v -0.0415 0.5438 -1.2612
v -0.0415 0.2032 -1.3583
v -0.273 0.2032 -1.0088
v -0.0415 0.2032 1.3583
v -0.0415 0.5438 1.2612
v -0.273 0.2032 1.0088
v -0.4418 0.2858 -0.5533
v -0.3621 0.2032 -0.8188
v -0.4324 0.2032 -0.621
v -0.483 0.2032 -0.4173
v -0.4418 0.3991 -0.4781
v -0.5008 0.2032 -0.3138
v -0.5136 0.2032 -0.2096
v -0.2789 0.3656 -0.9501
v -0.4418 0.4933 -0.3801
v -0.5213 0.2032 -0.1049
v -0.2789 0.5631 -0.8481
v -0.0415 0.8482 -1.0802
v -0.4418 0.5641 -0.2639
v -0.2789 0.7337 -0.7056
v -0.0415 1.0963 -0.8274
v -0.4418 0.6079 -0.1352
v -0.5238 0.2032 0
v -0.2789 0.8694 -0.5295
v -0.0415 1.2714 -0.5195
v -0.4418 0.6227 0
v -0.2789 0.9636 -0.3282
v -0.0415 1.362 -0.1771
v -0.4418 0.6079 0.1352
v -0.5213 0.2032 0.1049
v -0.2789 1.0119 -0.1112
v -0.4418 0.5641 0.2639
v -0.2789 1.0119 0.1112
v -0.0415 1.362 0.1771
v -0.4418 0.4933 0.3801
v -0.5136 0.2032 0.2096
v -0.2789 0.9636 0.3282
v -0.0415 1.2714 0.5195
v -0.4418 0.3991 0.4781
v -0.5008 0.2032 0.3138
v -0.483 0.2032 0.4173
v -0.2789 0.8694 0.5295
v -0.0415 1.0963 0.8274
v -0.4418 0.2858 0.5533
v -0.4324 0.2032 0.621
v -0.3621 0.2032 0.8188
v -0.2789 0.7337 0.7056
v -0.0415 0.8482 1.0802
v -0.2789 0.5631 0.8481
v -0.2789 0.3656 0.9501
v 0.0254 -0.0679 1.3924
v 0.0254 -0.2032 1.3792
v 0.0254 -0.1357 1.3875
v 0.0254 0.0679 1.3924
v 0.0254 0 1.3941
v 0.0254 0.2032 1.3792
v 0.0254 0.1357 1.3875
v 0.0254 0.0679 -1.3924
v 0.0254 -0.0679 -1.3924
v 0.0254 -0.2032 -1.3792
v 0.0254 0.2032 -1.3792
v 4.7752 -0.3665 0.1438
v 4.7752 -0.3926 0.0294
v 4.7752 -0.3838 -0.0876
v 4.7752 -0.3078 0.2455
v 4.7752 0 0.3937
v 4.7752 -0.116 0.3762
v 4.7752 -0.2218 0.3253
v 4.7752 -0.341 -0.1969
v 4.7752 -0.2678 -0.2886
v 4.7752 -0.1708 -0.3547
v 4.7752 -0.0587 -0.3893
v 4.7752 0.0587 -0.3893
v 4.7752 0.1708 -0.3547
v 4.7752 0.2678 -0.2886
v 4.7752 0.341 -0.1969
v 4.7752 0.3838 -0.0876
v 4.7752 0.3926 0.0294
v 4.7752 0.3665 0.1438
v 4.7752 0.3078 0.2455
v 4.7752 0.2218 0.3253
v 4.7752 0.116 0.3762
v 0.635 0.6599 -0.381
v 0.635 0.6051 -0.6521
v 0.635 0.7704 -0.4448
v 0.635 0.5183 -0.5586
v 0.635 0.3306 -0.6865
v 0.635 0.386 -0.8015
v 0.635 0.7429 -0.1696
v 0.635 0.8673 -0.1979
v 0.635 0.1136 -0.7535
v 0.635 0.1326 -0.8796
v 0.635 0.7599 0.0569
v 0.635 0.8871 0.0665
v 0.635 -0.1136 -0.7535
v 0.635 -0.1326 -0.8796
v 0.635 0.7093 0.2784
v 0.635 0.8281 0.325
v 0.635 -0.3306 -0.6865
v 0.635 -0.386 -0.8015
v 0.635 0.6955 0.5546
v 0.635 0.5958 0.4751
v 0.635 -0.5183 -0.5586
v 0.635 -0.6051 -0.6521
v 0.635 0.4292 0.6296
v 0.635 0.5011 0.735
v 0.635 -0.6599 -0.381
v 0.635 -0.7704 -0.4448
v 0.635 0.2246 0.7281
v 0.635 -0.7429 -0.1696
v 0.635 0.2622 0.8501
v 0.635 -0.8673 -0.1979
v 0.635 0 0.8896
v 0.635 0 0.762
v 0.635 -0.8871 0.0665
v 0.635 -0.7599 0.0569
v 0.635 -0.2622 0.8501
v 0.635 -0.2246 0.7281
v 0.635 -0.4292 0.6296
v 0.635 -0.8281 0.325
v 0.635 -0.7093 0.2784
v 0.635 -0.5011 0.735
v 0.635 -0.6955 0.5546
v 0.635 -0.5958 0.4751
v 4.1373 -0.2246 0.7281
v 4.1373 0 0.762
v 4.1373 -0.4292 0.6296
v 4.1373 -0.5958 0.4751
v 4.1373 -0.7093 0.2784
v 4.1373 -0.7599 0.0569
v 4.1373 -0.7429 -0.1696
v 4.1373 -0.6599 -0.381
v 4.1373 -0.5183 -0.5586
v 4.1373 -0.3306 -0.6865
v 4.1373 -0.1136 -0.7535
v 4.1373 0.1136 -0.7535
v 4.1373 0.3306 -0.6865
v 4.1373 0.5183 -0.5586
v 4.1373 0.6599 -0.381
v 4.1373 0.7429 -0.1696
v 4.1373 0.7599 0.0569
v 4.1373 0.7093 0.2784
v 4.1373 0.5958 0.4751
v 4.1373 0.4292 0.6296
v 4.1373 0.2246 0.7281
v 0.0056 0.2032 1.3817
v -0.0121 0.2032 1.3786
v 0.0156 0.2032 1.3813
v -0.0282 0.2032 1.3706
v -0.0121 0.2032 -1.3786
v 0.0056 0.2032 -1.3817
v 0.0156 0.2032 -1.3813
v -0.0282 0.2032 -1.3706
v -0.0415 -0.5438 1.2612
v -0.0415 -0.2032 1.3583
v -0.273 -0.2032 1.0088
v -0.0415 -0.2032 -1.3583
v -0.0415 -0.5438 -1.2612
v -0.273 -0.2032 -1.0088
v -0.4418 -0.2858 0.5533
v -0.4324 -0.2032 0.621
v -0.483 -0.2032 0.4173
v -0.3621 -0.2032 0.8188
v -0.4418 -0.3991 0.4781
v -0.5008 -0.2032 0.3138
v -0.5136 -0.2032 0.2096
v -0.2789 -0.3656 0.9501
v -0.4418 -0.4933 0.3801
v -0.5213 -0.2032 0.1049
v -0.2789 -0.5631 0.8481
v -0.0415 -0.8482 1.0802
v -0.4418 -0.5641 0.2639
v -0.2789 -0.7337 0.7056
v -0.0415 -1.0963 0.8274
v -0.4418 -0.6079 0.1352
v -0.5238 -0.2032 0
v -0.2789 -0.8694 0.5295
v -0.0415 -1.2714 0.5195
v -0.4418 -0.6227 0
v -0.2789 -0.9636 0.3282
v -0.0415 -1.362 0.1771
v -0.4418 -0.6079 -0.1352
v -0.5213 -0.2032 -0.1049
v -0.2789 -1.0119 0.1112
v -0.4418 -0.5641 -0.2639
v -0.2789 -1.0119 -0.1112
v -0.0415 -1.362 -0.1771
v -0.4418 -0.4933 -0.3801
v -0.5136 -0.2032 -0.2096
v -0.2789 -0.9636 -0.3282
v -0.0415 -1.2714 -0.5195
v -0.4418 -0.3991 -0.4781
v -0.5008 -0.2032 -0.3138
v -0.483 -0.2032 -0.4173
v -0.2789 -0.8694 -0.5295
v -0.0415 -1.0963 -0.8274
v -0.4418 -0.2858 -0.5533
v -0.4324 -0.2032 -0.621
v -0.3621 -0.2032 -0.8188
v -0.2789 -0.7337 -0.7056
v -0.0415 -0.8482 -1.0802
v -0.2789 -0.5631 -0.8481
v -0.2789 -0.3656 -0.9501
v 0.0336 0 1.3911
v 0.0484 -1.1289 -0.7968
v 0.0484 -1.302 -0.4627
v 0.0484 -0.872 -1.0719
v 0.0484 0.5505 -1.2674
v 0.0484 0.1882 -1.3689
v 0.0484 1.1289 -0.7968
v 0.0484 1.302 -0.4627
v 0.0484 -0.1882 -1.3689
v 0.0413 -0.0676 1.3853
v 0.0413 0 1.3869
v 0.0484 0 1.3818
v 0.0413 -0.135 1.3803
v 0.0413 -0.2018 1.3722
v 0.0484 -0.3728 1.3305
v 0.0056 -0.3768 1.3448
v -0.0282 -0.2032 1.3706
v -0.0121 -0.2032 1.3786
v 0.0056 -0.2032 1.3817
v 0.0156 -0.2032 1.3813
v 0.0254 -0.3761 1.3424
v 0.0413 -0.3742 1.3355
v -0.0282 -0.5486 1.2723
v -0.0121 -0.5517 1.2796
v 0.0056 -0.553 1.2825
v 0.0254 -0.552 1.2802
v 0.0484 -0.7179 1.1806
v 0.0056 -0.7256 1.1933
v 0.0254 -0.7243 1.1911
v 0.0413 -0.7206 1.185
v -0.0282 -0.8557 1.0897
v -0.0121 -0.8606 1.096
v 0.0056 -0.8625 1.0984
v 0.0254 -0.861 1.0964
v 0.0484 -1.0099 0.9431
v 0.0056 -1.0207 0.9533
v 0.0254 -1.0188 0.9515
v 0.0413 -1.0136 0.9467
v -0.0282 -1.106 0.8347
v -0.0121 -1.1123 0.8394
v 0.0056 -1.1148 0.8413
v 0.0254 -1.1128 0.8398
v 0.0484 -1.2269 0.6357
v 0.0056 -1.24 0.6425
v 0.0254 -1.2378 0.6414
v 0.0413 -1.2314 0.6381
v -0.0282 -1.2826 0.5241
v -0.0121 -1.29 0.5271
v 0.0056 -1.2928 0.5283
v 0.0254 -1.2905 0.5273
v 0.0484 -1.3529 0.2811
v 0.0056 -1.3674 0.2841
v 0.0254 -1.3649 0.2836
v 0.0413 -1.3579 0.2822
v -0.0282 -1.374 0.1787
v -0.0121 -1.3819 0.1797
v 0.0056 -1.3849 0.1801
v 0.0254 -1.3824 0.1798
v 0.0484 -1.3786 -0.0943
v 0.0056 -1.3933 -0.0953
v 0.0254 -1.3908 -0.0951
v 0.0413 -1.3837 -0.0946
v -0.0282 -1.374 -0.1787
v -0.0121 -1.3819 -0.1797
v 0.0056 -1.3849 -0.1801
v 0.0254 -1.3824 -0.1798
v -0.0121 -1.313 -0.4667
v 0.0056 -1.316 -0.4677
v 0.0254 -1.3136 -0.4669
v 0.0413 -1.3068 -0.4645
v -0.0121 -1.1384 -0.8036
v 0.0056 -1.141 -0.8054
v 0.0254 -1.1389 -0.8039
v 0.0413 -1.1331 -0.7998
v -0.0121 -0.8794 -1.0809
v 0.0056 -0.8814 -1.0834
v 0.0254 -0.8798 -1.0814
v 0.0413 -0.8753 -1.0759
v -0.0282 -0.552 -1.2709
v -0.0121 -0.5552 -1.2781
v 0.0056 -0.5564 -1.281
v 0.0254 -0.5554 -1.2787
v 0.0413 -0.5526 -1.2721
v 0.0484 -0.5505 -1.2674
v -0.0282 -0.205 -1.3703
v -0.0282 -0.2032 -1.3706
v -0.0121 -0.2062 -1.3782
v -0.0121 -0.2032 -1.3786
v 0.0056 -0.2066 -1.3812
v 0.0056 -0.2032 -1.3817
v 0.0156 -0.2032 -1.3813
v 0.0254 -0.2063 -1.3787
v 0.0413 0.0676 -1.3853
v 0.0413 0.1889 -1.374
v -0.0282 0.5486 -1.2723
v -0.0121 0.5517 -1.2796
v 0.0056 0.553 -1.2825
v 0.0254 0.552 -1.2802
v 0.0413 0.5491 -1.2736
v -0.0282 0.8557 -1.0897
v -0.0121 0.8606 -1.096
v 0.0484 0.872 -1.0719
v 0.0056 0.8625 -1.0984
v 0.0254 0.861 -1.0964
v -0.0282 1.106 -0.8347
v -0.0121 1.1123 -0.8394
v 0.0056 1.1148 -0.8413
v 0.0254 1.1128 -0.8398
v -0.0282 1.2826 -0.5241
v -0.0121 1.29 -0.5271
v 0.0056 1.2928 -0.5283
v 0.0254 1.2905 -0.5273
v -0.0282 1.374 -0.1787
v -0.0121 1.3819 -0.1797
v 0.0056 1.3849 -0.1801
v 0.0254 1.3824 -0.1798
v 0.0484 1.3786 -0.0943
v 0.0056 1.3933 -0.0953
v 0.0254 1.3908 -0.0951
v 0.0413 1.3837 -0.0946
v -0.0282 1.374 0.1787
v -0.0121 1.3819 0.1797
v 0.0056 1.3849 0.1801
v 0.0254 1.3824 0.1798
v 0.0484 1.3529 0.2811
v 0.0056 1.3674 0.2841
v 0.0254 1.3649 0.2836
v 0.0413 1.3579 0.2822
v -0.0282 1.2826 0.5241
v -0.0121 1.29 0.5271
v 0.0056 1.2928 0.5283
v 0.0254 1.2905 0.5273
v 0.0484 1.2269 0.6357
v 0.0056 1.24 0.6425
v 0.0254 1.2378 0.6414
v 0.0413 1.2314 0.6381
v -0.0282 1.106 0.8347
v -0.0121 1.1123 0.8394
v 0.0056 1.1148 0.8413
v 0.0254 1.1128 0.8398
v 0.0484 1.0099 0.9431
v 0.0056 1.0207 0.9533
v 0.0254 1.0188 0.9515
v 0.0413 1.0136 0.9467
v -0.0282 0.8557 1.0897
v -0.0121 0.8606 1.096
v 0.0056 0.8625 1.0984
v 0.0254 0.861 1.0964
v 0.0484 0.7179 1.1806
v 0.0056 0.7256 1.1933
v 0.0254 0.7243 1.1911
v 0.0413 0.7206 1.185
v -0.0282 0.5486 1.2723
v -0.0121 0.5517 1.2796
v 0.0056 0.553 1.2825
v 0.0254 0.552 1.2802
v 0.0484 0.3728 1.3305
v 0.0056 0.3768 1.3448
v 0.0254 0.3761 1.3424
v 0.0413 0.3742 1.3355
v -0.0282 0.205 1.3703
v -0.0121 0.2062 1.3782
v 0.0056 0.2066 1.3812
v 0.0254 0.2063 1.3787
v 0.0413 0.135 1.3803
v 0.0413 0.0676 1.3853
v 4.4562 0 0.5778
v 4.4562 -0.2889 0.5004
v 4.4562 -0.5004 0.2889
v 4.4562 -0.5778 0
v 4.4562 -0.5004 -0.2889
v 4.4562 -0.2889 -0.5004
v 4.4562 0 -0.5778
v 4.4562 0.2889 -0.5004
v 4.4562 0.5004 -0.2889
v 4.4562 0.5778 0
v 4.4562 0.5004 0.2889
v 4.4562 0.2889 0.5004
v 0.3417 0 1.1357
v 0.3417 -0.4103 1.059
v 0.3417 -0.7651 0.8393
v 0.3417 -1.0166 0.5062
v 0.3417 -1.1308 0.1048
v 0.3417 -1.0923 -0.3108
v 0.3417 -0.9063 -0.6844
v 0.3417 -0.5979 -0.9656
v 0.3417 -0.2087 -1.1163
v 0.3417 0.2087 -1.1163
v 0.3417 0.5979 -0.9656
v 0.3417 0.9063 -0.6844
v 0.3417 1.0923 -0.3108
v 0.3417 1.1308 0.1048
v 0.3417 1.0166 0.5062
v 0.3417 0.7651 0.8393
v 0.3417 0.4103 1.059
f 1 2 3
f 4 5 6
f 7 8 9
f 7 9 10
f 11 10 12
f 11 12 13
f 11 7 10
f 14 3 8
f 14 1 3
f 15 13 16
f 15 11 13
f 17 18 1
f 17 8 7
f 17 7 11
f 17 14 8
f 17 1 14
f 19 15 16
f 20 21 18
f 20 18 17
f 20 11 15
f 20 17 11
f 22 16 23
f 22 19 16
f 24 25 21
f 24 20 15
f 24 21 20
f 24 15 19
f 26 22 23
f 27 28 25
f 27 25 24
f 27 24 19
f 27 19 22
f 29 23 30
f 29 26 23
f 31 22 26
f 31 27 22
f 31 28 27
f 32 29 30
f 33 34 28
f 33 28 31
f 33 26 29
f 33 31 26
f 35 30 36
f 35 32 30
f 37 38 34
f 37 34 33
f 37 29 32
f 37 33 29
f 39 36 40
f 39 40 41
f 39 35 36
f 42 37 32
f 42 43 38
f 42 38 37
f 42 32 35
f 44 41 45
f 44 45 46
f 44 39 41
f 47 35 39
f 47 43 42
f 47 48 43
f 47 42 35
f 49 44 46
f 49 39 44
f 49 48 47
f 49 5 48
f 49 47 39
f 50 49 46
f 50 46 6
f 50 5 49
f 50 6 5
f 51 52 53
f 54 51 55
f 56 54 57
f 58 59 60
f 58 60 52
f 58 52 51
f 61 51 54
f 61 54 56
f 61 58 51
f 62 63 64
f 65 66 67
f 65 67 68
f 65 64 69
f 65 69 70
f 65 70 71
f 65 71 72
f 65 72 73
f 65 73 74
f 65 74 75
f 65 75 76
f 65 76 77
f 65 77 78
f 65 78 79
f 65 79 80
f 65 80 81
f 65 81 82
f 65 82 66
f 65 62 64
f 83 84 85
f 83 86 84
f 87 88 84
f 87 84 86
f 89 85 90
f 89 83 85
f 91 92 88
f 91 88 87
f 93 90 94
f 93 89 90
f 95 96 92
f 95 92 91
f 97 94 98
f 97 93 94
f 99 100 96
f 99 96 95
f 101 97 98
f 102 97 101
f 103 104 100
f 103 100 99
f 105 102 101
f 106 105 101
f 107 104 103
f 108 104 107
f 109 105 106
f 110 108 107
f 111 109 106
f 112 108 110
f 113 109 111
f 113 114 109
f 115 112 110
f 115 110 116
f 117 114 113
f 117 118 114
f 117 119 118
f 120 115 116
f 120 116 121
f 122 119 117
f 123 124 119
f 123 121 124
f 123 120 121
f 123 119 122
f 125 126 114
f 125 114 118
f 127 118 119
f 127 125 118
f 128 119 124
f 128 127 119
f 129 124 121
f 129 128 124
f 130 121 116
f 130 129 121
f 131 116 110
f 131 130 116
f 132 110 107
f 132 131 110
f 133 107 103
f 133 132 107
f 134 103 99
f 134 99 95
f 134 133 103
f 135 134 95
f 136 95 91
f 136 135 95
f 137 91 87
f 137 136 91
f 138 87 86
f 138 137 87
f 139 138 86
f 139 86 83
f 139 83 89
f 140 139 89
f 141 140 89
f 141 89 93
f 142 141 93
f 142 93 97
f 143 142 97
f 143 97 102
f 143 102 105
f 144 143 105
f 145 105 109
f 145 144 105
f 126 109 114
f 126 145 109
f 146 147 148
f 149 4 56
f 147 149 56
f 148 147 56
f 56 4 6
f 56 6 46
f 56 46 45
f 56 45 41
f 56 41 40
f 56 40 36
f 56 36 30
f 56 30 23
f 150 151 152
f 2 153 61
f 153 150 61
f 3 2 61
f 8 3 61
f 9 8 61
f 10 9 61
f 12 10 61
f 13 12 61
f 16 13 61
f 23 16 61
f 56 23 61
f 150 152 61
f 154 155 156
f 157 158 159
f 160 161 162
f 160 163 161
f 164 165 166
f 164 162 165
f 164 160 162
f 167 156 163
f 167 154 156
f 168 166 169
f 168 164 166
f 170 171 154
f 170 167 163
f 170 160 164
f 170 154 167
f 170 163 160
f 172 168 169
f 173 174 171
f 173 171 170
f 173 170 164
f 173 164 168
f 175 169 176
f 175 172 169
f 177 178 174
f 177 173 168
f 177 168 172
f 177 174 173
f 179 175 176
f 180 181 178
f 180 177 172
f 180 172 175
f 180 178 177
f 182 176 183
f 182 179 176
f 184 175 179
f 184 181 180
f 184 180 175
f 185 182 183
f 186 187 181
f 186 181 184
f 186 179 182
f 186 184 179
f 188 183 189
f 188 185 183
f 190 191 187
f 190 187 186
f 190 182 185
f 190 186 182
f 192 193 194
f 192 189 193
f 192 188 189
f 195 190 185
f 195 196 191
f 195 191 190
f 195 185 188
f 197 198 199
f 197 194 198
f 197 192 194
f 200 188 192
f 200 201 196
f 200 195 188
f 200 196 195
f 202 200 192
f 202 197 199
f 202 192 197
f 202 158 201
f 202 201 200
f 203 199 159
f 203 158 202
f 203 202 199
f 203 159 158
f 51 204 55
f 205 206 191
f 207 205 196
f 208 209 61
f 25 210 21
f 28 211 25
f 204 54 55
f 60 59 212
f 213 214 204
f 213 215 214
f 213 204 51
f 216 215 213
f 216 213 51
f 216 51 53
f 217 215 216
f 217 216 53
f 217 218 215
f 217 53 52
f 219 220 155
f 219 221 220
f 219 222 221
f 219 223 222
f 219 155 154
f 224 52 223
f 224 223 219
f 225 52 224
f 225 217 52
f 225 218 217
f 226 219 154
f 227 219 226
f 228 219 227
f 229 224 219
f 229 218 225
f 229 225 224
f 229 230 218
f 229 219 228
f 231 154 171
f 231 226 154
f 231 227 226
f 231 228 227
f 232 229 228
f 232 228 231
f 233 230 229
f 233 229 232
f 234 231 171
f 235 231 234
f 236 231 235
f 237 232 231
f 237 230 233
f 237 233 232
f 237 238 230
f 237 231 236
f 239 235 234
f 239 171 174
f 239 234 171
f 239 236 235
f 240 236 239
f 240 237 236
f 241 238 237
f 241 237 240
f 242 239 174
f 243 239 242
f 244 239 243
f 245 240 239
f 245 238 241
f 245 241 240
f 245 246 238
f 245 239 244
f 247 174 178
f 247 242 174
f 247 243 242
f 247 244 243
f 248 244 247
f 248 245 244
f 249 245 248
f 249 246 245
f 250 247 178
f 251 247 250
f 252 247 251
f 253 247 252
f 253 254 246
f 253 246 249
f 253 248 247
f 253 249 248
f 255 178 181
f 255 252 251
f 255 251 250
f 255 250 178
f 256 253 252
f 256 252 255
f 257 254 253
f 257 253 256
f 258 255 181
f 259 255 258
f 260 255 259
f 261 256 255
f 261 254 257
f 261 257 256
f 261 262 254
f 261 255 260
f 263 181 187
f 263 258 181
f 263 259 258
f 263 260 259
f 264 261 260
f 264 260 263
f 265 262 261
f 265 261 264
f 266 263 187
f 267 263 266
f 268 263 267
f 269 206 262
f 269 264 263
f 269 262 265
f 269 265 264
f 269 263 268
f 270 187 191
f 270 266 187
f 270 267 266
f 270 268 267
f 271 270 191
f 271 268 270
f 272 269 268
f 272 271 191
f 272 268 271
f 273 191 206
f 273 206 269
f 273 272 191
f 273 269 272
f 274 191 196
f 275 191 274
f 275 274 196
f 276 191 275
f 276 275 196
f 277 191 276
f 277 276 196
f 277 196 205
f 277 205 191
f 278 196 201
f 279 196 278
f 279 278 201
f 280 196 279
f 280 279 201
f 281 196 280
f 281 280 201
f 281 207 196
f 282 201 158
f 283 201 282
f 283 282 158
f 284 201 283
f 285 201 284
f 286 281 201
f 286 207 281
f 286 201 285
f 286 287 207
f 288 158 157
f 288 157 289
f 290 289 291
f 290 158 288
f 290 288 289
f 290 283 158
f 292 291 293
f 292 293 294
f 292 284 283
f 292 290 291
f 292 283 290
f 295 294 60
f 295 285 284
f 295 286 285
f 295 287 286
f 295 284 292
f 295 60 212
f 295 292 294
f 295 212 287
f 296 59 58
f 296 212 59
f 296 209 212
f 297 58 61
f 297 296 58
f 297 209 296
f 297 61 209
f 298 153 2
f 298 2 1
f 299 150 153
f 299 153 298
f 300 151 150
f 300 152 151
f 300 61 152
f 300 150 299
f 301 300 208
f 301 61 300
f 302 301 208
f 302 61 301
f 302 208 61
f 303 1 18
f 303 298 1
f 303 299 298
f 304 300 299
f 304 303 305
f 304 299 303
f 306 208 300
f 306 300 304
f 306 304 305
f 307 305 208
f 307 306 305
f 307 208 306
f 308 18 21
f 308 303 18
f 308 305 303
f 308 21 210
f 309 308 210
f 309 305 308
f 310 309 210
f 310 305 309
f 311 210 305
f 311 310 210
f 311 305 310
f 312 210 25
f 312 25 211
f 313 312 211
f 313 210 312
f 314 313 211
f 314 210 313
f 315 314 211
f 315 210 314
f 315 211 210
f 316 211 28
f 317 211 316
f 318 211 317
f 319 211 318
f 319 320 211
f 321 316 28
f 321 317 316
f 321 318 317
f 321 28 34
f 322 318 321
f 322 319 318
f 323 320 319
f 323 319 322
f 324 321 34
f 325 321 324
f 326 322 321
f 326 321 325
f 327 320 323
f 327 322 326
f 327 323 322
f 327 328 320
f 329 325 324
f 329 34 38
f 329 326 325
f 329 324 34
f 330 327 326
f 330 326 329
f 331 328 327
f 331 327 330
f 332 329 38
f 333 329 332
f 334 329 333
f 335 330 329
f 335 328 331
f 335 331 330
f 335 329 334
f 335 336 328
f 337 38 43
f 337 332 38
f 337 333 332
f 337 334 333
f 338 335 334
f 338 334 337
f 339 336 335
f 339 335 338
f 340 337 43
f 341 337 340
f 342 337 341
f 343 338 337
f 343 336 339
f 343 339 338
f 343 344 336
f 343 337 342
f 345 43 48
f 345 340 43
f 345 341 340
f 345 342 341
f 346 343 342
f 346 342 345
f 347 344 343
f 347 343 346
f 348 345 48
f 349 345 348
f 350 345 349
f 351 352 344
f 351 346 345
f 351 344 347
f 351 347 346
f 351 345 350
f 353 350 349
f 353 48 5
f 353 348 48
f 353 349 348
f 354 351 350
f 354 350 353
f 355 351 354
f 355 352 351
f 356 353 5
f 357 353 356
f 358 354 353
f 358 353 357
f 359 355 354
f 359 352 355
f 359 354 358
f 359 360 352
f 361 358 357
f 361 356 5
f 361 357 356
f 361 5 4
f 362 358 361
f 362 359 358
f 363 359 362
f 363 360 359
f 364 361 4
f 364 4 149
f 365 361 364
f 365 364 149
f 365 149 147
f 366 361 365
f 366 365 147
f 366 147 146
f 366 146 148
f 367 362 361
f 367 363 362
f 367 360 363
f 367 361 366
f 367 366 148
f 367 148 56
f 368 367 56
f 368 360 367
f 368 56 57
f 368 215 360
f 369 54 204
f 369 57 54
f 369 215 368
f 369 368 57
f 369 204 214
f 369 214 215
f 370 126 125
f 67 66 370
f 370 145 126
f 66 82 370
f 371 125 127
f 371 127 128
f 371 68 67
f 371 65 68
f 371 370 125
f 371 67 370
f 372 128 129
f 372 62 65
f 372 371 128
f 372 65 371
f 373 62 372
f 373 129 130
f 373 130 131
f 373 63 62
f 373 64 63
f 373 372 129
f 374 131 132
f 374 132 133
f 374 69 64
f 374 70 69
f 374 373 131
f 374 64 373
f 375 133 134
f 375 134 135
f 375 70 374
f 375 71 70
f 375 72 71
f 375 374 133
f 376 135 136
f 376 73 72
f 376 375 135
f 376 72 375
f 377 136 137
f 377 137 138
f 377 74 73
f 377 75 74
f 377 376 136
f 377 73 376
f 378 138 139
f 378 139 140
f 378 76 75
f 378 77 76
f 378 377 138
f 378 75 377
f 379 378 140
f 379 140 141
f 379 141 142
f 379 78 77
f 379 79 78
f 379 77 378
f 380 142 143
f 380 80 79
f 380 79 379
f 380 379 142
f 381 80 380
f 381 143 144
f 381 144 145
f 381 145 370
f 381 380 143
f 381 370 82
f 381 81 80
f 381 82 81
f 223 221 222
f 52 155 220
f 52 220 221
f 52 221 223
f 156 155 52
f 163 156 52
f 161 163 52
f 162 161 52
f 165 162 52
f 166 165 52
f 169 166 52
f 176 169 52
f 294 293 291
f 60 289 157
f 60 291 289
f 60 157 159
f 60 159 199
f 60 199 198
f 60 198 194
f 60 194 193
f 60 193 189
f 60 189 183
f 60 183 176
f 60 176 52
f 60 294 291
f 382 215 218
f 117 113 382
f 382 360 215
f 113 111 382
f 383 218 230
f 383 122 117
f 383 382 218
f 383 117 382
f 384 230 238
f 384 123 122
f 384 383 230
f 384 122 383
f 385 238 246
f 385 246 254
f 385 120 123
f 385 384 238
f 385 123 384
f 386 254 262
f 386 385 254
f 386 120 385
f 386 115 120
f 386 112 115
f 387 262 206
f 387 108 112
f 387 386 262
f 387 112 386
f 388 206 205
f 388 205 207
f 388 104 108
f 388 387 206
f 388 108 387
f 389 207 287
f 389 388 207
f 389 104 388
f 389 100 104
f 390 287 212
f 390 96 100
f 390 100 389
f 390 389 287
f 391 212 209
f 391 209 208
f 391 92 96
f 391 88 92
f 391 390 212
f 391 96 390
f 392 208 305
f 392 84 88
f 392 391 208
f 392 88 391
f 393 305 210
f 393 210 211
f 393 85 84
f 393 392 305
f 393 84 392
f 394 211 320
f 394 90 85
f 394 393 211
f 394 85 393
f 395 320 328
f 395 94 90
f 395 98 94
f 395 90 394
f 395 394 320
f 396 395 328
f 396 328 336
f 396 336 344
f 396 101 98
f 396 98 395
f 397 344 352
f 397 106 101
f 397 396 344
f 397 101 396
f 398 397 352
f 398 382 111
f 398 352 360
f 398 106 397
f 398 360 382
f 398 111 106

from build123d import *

# Parameters (mm, degrees)
SLOT_CUT_EXTRUDE1_DEPTH      = 6.167561086
SLOT_CUT_EXTRUDE1_DEPTH_BACK = 6.167561086
SKETCH2_W                    = 0.5588
SKETCH2_H                    = 0.4064


with BuildPart() as part:
    # Sketch1 → base-Revolve (revolve)
    with BuildSketch(Plane.XY, mode=Mode.PRIVATE) as base_revolve_sk:
        with BuildLine():
            Line((0.048416124, 1.381774048), (0.635, 0.889571734))
            Line((0.635, 0.889571734), (0.635, 0.762))
            Line((0.635, 0.762), (4.7752, 0.762))
            Line((4.7752, 0.762), (4.7752, 0))
            Line((4.7752, 0), (0, 0))
            Line((0, 0), (-0.5334, 0))
            ThreePointArc((-0.5334, 0), (-0.406704998, 0.729445049), (-0.041460392, 1.373446664))
            ThreePointArc((-0.041460392, 1.373446664), (0.001740699, 1.396359404), (0.048416124, 1.381774048))
        make_face()
    revolve(base_revolve_sk.sketch.rotate(Axis((0, 0, 0), (1, 0, 0)), 90), axis=Axis((0, 0, 0), (1, 0, 0)))

    # Sketch2 → slot_Cut-Extrude1 (cut, two sides: drawn at the far end of the back side and taken through both)
    with BuildSketch(Plane.XY.offset(-SLOT_CUT_EXTRUDE1_DEPTH_BACK)):
        with Locations((-0.254, 0)):
            Rectangle(SKETCH2_W, SKETCH2_H)
    extrude(amount=SLOT_CUT_EXTRUDE1_DEPTH + SLOT_CUT_EXTRUDE1_DEPTH_BACK, mode=Mode.SUBTRACT)

    # Sketch8 → point_Cut-Revolve1 (revolve, cut)
    with BuildSketch(Plane.XY, mode=Mode.PRIVATE) as point_cut_revolve1_sk:
        Polygon((4.7752, 0), (5.2832, 0), (5.2832, 1.27), (4.137285688, 1.27), (4.137285688, 0.762), (4.7752, 0.3937), align=None)
    revolve(point_cut_revolve1_sk.sketch.rotate(Axis((0, 0, 0), (1, 0, 0)), 90), axis=Axis((0, 0, 0), (1, 0, 0)), mode=Mode.SUBTRACT)


solid = part.part
